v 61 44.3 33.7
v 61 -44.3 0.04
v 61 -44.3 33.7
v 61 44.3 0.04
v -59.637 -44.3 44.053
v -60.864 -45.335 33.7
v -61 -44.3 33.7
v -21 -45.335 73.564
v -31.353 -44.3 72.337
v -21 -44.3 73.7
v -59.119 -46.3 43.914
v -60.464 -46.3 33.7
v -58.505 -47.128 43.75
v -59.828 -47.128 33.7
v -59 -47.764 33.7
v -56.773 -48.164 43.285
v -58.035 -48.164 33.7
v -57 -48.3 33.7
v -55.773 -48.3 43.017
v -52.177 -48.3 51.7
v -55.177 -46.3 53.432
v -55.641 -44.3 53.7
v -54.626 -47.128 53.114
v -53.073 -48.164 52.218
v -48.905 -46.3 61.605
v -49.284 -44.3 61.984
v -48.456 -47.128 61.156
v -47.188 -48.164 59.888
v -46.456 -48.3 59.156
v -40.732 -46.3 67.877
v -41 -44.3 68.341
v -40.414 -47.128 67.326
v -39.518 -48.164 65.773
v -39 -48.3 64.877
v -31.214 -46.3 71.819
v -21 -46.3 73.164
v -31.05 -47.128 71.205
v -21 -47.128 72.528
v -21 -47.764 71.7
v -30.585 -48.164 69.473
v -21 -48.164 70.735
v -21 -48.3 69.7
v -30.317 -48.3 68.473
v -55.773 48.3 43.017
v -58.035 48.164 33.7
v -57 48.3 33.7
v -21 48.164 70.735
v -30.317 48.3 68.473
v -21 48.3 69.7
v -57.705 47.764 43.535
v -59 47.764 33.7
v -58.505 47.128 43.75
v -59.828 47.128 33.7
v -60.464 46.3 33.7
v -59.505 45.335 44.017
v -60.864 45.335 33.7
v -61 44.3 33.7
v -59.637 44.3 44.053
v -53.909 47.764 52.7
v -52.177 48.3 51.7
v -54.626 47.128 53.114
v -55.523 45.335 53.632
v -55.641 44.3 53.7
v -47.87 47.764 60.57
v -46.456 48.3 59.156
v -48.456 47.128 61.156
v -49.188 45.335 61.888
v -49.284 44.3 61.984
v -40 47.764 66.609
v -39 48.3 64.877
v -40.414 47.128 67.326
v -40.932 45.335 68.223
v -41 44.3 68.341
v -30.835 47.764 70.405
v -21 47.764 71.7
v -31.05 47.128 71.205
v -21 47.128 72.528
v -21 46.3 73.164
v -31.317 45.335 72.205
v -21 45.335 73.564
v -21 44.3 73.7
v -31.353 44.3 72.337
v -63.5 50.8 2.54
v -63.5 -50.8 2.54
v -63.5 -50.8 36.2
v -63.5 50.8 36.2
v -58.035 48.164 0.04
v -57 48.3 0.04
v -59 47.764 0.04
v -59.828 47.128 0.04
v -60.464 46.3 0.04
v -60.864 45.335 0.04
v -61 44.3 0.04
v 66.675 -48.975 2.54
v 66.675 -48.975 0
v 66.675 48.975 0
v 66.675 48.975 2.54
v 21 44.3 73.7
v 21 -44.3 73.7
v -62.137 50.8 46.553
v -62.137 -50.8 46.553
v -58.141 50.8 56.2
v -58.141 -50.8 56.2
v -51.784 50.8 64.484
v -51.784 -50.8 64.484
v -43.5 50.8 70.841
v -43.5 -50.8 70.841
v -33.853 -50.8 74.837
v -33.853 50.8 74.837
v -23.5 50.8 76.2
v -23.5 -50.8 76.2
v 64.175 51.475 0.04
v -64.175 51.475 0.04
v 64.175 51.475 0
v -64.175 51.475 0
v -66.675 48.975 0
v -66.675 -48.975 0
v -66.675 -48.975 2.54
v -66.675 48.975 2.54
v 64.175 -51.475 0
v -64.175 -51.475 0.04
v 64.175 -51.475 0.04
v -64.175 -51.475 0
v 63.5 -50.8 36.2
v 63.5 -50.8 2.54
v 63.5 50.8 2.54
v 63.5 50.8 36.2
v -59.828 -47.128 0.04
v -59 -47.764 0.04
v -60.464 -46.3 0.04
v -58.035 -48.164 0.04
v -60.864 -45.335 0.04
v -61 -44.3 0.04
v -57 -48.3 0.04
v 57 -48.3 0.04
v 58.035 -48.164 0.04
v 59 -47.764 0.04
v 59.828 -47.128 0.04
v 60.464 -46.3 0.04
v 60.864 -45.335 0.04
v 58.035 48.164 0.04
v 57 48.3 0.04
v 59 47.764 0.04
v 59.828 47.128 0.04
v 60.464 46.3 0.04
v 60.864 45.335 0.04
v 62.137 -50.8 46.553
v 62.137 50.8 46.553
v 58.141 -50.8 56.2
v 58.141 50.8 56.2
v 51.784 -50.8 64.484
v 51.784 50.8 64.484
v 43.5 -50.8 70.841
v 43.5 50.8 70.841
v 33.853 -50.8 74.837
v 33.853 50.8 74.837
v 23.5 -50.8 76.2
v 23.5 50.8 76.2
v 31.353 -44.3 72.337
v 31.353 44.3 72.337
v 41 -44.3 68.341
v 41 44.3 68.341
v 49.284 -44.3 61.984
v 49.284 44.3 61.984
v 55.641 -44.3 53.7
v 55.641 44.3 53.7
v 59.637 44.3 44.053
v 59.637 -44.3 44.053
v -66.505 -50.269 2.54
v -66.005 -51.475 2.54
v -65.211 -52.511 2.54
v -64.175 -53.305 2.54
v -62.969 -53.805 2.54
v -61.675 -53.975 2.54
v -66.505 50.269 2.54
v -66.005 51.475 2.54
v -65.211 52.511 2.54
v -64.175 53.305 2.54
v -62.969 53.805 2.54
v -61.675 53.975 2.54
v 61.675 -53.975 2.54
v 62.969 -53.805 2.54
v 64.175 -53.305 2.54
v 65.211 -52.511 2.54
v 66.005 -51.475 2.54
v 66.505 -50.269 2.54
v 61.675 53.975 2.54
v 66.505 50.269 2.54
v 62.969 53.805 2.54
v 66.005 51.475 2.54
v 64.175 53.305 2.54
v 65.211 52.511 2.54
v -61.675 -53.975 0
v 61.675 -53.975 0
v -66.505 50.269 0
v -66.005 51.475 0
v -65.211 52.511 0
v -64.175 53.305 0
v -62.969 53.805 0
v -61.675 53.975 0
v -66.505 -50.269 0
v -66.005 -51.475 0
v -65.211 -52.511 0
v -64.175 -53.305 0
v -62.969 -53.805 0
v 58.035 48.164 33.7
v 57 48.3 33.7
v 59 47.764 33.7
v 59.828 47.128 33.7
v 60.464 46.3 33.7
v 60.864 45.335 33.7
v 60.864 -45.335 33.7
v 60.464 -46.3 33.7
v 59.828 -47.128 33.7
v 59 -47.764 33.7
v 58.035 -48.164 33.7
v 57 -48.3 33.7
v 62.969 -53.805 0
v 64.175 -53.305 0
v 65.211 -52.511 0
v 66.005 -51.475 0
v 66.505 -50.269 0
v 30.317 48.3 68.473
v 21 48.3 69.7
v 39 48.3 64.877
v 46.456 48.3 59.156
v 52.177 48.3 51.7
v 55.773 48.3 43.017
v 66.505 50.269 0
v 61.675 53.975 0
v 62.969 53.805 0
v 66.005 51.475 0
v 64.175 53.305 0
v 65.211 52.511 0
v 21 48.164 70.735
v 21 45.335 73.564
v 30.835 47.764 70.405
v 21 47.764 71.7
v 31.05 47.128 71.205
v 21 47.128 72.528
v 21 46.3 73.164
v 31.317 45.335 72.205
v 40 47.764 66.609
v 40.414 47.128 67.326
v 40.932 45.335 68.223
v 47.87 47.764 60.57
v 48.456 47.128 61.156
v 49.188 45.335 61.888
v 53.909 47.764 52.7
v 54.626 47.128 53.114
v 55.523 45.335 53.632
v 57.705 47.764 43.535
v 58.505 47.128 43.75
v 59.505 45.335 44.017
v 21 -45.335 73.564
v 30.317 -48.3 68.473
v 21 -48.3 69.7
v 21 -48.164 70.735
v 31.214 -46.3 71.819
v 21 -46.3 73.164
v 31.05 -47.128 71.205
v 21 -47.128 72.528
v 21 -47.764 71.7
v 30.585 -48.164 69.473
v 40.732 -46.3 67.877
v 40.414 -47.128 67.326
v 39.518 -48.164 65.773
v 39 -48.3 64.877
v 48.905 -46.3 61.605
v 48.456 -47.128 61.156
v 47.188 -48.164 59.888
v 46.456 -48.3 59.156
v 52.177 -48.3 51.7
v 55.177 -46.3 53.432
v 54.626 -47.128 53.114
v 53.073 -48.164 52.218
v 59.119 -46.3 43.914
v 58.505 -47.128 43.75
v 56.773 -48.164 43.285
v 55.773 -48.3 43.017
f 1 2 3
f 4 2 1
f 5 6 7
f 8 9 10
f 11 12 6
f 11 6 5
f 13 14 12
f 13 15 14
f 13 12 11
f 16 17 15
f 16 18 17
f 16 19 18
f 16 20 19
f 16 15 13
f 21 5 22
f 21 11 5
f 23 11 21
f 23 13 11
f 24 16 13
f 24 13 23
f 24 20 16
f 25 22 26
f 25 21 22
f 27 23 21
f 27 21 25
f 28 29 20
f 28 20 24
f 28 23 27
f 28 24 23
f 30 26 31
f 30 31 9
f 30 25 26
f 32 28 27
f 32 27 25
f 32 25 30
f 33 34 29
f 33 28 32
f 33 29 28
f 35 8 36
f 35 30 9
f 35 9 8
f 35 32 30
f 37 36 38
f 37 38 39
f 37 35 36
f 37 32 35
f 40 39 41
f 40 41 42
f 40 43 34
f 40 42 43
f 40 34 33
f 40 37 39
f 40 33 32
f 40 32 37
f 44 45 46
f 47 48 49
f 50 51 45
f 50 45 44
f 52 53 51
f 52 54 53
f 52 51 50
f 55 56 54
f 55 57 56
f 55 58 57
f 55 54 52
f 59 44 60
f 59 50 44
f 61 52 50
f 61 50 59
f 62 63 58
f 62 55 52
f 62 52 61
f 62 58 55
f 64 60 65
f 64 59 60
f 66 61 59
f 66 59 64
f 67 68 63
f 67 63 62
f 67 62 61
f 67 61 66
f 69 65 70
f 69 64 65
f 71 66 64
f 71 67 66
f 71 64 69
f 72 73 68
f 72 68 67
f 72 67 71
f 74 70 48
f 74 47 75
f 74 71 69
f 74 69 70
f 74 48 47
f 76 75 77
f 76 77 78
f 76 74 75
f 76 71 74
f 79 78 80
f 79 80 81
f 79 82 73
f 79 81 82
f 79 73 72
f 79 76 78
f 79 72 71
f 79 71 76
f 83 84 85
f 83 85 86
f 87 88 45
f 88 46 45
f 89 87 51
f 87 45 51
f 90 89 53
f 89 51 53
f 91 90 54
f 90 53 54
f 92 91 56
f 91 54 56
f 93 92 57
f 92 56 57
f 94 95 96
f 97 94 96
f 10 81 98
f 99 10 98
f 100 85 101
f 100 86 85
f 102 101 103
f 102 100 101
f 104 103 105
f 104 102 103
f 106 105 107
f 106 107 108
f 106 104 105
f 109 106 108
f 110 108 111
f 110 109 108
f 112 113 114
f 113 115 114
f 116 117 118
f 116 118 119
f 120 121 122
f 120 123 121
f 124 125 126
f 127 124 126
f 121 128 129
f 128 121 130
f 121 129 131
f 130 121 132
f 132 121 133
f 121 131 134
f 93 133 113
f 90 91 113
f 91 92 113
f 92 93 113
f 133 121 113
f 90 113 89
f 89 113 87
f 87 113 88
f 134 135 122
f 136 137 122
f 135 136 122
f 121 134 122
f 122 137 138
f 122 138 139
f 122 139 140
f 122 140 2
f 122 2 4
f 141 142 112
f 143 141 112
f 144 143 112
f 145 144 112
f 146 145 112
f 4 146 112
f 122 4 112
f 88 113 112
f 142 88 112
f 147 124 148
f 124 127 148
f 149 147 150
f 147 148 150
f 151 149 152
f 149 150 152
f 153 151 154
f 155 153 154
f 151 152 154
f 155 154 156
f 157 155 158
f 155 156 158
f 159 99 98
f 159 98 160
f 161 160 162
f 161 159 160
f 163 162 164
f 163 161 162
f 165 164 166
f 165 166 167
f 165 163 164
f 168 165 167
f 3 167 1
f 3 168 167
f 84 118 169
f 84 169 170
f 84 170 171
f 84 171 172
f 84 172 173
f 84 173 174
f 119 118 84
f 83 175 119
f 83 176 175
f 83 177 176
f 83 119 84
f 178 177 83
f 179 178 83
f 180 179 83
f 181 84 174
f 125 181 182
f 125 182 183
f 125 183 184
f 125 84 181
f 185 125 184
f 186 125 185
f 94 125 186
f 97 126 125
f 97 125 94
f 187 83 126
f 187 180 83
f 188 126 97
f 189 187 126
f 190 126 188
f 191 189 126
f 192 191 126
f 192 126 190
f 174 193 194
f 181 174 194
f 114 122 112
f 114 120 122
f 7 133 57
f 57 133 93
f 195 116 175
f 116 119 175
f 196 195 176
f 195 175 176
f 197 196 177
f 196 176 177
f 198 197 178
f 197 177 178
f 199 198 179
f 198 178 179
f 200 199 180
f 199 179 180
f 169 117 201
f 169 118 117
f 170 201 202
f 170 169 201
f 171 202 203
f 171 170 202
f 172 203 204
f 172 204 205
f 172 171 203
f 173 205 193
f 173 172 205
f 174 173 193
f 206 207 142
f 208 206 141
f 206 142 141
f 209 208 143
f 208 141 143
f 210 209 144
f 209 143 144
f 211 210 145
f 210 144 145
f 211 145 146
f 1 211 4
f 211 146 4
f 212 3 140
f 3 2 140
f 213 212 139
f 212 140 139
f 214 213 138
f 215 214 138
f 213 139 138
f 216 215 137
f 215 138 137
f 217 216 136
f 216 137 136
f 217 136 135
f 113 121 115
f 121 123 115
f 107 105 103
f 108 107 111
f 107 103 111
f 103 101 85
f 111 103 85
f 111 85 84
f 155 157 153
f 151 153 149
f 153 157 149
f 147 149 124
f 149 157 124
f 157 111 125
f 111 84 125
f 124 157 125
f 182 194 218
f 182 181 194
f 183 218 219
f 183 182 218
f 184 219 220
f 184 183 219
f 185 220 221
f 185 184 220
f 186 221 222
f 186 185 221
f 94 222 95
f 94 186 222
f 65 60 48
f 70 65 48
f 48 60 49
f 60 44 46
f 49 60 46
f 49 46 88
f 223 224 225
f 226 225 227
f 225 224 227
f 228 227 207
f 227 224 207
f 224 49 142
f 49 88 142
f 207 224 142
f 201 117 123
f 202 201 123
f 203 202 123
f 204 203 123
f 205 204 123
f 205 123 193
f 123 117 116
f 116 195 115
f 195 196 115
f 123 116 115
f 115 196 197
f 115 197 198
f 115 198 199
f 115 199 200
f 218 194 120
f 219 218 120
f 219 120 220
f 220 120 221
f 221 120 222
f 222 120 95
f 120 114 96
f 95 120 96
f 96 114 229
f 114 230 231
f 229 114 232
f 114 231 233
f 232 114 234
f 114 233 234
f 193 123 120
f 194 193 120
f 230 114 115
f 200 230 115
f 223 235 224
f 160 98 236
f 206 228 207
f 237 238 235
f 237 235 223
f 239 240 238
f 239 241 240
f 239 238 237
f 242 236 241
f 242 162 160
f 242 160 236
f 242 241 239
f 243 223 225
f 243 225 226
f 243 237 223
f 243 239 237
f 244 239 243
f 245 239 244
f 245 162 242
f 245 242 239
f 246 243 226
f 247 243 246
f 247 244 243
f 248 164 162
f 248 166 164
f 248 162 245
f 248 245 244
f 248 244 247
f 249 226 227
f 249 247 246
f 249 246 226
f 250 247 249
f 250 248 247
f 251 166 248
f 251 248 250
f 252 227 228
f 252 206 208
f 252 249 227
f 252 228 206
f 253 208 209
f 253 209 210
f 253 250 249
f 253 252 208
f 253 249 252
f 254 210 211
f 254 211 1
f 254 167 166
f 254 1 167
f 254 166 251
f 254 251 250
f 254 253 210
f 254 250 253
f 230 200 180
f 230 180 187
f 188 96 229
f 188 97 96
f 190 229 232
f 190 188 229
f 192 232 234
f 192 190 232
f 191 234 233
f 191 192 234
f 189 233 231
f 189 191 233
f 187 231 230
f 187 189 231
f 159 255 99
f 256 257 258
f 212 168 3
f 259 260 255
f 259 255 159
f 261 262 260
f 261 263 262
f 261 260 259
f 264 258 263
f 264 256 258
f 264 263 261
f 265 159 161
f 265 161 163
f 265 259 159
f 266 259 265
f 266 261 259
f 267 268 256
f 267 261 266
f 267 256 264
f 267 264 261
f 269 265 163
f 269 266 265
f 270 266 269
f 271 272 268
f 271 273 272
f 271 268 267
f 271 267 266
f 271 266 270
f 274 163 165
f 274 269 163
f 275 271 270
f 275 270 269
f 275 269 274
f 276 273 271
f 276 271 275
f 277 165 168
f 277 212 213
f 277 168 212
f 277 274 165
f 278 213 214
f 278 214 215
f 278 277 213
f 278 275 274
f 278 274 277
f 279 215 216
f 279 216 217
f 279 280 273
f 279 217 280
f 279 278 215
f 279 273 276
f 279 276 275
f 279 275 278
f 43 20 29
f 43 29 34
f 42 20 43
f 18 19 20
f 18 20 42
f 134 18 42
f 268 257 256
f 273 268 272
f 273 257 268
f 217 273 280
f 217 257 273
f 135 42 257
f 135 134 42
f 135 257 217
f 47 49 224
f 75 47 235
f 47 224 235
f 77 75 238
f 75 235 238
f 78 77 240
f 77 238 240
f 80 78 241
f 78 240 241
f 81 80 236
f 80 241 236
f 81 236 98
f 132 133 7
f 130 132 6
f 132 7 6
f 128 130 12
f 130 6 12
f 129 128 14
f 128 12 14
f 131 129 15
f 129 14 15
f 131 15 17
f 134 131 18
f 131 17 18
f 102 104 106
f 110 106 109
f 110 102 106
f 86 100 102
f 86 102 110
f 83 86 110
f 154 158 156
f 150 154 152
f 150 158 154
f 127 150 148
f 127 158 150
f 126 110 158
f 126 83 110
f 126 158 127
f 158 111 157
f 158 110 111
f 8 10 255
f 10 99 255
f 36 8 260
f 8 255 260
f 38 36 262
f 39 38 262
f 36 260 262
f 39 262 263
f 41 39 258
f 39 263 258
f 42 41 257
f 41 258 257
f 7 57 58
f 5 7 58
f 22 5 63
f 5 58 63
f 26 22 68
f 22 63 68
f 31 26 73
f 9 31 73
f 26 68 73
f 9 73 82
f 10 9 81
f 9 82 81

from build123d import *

# Parameters (mm, degrees)
F0_W     = 133.35
F0_H     = 107.95
F1_DEPTH = 76.2
F2_W     = 127
F2_H     = 101.6
F3_DEPTH = 76.2
F4_DEPTH = 73.66
F5_DEPTH = 76.2
F6_T     = -2.5
F7_R     = 40
F8_R     = 4
F9_R     = 5
F10_R    = 40


with BuildPart() as f1:
    # F0 (on Top) → F1 (new body)
    with BuildSketch(Plane.XY):
        Rectangle(F0_W, F0_H)
    extrude(amount=F1_DEPTH)

    # F2 (on Top) → F3 (cut)
    with BuildSketch(Plane.XY):
        Rectangle(F2_W, F2_H)
    extrude(amount=F3_DEPTH, mode=Mode.SUBTRACT)

    # F4 (cut): a face of the model
    f4_faces = [f1.faces().sort_by_distance(p)[0] for p in [
        (64.9593244771, 0, 76.2),
    ]]
    extrude(f4_faces, amount=-F4_DEPTH, mode=Mode.SUBTRACT)

    # F2 (on Top) → F5 (join)
    with BuildSketch(Plane.XY):
        Rectangle(F2_W, F2_H)
    extrude(amount=F5_DEPTH)

    # F6
    f6_openings = [f1.faces().sort_by_distance(p)[0] for p in [
        (0, 0, 0),
    ]]
    offset(amount=F6_T, openings=f6_openings, kind=Kind.INTERSECTION)

    # F7
    f7_edges = [f1.edges().sort_by_distance(p)[0] for p in [
        (-61, 0, 73.7),
        (61, 0, 73.7),
    ]]
    fillet(f7_edges, radius=F7_R)

    # F8
    f8_edges = [f1.edges().sort_by_distance(p)[0] for p in [
        (-49.284271, -48.3, 61.984271),
        (49.284271, 48.3, 61.984271),
    ]]
    fillet(f8_edges, radius=F8_R)

    # F9
    f9_edges = [f1.edges().sort_by_distance(p)[0] for p in [
        (66.675, 53.975, 1.27),
        (66.675, -53.975, 1.27),
        (-66.675, -53.975, 1.27),
        (-66.675, 53.975, 1.27),
    ]]
    fillet(f9_edges, radius=F9_R)

    # F10
    f10_edges = [f1.edges().sort_by_distance(p)[0] for p in [
        (-63.5, 0, 76.2),
        (63.5, 0, 76.2),
    ]]
    fillet(f10_edges, radius=F10_R)


solid = f1.part
